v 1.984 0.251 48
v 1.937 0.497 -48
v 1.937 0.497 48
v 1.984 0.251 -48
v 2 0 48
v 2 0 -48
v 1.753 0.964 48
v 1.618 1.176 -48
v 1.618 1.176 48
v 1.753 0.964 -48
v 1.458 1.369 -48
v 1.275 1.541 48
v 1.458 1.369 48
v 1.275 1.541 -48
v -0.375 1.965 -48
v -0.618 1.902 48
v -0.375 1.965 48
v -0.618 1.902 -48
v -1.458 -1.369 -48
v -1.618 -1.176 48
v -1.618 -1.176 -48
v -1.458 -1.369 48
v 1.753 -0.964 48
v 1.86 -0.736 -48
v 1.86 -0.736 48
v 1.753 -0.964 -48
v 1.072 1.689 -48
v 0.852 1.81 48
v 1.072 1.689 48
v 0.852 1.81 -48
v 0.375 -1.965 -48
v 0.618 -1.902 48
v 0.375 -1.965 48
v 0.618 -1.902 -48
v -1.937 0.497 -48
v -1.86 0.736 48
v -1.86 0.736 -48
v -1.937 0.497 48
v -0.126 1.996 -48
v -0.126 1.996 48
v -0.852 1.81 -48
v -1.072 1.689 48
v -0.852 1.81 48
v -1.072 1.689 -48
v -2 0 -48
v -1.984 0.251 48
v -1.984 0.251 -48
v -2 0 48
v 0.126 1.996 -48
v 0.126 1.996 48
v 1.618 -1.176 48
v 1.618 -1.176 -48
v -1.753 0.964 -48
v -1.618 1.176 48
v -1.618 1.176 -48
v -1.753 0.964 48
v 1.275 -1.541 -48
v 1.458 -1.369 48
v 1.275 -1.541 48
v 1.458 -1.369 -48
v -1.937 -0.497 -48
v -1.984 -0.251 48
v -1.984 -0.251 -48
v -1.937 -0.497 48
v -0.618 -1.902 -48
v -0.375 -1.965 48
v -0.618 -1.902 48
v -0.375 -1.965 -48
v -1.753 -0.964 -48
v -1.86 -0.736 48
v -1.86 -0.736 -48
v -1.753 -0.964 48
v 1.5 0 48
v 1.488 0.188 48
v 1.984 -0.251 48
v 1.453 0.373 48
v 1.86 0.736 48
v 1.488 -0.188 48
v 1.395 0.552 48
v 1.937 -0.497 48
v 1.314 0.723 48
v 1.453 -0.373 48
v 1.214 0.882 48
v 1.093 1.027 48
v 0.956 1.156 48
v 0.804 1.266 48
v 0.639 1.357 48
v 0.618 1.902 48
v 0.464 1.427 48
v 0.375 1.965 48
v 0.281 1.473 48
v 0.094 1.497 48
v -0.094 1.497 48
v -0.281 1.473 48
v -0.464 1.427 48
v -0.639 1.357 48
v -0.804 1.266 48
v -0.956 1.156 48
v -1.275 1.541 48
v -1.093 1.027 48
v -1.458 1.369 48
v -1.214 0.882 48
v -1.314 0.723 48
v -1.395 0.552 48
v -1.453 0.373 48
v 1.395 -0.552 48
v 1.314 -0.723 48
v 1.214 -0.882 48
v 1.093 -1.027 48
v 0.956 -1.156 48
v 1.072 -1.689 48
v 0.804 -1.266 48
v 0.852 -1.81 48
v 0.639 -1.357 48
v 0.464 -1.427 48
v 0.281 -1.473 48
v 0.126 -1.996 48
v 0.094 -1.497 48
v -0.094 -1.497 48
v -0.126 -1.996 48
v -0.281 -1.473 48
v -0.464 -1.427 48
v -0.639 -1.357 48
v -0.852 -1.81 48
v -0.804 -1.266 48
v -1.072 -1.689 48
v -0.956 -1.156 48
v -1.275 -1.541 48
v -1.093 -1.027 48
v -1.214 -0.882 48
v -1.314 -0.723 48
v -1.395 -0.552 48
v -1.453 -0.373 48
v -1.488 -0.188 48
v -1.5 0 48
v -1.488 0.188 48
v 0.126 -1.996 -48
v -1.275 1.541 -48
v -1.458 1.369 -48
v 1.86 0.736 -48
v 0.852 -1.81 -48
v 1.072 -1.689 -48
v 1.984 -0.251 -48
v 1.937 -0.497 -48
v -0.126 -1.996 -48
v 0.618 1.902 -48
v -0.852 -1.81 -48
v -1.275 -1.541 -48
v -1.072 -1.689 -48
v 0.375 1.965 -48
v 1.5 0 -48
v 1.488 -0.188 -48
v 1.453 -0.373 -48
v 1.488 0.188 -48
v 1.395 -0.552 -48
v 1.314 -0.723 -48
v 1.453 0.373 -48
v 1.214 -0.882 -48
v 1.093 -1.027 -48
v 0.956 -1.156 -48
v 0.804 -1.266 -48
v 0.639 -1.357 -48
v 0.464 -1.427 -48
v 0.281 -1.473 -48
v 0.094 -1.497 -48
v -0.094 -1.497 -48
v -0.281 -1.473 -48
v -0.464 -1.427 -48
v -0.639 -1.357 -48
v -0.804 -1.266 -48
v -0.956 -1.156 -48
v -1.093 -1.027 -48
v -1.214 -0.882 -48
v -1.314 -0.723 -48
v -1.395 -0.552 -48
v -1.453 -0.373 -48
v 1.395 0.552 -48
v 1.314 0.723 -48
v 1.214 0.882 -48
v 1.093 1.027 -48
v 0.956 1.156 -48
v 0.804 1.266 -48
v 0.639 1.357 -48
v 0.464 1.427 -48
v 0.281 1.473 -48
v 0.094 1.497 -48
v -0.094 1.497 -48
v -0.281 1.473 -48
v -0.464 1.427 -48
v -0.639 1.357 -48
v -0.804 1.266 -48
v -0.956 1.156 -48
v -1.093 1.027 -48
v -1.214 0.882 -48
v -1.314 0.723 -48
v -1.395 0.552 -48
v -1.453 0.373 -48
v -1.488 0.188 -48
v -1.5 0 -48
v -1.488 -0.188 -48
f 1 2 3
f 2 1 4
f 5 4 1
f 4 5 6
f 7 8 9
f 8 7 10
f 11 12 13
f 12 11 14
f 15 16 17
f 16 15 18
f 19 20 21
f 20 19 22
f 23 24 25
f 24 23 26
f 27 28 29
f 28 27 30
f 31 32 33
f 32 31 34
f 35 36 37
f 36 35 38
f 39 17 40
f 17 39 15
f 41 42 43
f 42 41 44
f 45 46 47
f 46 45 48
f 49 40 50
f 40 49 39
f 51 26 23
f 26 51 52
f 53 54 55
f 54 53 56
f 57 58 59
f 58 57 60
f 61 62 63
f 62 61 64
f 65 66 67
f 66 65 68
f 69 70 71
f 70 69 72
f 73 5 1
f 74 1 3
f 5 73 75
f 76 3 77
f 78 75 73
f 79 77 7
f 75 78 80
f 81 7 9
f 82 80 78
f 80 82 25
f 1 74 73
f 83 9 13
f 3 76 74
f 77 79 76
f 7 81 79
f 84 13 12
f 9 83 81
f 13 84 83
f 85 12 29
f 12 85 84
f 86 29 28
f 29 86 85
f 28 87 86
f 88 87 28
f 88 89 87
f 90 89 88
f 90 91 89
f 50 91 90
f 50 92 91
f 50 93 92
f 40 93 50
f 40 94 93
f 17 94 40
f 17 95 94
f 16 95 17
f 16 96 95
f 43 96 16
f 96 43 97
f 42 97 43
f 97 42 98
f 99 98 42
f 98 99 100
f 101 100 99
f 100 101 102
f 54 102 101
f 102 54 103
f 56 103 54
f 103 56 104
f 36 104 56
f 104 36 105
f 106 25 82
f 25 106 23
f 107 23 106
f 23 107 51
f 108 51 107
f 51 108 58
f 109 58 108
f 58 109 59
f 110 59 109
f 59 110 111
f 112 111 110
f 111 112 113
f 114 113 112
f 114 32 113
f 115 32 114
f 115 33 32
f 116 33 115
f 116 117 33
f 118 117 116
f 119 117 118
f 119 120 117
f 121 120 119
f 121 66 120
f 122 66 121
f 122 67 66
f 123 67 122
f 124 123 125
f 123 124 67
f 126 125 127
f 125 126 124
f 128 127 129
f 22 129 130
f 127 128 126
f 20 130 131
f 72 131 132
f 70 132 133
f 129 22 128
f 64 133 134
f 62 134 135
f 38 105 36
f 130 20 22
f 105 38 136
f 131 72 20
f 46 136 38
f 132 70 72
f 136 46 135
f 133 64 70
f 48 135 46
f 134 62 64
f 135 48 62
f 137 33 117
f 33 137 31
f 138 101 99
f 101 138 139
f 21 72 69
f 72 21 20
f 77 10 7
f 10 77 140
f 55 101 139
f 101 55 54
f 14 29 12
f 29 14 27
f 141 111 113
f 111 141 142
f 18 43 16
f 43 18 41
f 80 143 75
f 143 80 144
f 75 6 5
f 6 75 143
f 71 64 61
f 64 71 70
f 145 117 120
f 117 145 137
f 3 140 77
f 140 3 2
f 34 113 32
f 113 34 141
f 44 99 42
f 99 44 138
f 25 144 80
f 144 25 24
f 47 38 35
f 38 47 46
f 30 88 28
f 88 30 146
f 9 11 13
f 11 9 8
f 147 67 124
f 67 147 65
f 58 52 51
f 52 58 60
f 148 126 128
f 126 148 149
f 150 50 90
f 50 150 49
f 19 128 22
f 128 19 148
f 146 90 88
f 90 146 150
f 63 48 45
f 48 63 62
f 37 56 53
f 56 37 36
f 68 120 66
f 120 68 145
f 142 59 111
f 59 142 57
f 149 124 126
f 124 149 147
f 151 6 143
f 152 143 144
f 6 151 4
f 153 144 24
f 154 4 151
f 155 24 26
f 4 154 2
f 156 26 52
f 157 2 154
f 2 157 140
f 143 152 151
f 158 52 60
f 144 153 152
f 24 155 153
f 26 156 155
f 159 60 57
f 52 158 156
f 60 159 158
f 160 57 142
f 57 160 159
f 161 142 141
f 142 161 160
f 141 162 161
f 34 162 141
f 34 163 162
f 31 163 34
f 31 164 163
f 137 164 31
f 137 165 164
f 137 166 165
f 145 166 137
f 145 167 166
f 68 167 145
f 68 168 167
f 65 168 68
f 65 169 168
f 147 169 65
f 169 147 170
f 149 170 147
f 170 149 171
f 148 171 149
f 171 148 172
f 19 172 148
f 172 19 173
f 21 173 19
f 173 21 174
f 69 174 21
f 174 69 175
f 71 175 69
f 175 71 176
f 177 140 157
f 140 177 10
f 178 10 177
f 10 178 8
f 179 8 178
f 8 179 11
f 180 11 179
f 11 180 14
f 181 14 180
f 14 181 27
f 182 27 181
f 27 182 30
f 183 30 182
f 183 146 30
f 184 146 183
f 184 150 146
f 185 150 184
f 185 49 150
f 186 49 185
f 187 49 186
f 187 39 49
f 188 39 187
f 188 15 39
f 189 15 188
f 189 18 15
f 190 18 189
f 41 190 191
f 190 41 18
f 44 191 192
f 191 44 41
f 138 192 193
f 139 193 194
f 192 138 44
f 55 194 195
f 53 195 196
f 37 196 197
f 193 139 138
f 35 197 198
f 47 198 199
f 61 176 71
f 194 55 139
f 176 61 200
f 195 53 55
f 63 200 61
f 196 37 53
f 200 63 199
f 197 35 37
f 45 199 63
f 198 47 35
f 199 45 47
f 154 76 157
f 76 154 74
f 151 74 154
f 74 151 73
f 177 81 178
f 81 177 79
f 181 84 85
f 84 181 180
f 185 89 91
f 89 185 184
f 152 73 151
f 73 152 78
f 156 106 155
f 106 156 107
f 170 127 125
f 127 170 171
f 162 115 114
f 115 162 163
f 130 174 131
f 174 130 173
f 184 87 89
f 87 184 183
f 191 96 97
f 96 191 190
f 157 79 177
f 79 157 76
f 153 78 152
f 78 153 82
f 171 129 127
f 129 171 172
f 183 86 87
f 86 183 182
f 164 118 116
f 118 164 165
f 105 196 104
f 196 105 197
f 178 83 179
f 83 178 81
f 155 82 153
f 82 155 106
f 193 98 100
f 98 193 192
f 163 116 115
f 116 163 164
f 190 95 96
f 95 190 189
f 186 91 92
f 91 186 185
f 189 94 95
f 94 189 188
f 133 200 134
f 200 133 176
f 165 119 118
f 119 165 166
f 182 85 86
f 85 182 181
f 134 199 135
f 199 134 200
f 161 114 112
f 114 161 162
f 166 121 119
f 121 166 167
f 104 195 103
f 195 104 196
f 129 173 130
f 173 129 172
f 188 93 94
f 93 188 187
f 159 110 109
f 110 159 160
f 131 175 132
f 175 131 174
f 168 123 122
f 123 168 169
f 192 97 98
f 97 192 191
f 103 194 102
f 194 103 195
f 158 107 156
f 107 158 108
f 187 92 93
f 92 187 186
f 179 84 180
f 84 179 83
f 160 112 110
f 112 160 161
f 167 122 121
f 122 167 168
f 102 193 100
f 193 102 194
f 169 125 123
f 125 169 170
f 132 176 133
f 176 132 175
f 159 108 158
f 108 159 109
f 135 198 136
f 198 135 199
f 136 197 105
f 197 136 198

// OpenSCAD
$fn = 50;


difference() {
	union() {
		translate(v = [0, 0, -48.0000000000]) {
			cylinder(h = 96, r = 2.0000000000);
		}
	}
	union() {
		translate(v = [0, 0, -100.0000000000]) {
			cylinder(h = 200, r = 1.5000000000);
		}
	}
}
